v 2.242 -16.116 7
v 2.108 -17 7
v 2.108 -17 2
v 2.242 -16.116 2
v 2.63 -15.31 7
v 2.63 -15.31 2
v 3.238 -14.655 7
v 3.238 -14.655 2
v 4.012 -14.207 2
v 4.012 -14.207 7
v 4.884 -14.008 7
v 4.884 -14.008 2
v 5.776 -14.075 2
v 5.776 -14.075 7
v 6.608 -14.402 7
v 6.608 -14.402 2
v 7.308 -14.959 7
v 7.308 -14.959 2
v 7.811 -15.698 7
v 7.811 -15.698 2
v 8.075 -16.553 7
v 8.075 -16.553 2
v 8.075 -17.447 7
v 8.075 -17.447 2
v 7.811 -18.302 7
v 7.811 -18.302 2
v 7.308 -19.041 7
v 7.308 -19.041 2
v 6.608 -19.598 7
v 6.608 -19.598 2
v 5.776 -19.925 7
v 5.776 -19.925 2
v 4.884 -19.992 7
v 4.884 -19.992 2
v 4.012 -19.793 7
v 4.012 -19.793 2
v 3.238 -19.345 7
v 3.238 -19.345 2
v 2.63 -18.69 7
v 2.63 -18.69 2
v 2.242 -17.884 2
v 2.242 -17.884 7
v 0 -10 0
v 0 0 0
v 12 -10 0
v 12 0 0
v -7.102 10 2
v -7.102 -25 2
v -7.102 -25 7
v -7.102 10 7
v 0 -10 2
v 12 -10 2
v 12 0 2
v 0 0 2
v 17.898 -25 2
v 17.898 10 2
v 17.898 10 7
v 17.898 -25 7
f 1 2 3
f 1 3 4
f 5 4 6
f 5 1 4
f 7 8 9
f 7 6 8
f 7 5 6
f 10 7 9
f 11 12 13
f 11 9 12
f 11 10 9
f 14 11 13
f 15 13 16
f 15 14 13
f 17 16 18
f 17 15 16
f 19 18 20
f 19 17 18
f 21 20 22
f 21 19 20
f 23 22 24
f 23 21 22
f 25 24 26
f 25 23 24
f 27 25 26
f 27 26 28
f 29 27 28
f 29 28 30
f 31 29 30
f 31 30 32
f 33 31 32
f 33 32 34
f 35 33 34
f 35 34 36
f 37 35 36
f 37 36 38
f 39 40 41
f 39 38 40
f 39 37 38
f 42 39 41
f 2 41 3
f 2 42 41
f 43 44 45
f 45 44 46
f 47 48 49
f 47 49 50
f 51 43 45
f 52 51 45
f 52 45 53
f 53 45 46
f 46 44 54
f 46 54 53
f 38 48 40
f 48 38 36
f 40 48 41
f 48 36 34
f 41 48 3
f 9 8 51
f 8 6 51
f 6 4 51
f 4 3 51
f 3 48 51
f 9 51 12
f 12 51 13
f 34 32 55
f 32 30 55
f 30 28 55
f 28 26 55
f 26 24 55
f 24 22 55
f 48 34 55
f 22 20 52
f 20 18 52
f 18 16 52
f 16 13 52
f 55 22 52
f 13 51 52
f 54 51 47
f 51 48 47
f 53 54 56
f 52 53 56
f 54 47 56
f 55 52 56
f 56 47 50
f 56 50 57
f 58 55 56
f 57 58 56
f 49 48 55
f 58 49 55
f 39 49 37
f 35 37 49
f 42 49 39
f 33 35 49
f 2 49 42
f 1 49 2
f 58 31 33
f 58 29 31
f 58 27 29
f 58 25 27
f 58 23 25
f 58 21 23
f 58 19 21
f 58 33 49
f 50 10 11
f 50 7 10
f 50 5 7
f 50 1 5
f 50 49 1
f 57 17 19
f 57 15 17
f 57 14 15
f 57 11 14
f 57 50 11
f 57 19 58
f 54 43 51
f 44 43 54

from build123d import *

# Parameters (mm, degrees)
SKIZZE1_W                            = 12
SKIZZE1_H                            = 10
HALTERUNGSSOCKEL_DEPTH               = 2
SKIZZE2_W                            = 25
SKIZZE2_H                            = 35
AUFSATZ_LINEAR_AUSTRAGEN2_DEPTH      = 5
SCHNITT_LINEAR_AUSTRAGEN1_DEPTH      = 32.533266888
SCHNITT_LINEAR_AUSTRAGEN1_DEPTH_BACK = 32.533266888
SKIZZE3_R                            = 3


with BuildPart() as part:
    # Skizze1 → Halterungssockel (new body)
    with BuildSketch(Plane.XY):
        with Locations((6, -5)):
            Rectangle(SKIZZE1_W, SKIZZE1_H)
    extrude(amount=HALTERUNGSSOCKEL_DEPTH)

    # Skizze2 → Aufsatz-Linear austragen2 (add)
    with BuildSketch(Plane.XY.offset(2)):
        with Locations((5.39823792, -7.5)):
            Rectangle(SKIZZE2_W, SKIZZE2_H)
    extrude(amount=AUFSATZ_LINEAR_AUSTRAGEN2_DEPTH)

    # Skizze3 → Schnitt-Linear austragen1 (cut, two sides: drawn at the far end of the back side and taken through both)
    with BuildSketch(Plane(origin=(0, 0, 0), x_dir=(-1, 0, 0), z_dir=(0, 0, -1)).offset(-SCHNITT_LINEAR_AUSTRAGEN1_DEPTH_BACK)):
        with Locations((-5.108390275, -17)):
            Circle(SKIZZE3_R)
    extrude(amount=SCHNITT_LINEAR_AUSTRAGEN1_DEPTH + SCHNITT_LINEAR_AUSTRAGEN1_DEPTH_BACK, mode=Mode.SUBTRACT)


solid = part.part
